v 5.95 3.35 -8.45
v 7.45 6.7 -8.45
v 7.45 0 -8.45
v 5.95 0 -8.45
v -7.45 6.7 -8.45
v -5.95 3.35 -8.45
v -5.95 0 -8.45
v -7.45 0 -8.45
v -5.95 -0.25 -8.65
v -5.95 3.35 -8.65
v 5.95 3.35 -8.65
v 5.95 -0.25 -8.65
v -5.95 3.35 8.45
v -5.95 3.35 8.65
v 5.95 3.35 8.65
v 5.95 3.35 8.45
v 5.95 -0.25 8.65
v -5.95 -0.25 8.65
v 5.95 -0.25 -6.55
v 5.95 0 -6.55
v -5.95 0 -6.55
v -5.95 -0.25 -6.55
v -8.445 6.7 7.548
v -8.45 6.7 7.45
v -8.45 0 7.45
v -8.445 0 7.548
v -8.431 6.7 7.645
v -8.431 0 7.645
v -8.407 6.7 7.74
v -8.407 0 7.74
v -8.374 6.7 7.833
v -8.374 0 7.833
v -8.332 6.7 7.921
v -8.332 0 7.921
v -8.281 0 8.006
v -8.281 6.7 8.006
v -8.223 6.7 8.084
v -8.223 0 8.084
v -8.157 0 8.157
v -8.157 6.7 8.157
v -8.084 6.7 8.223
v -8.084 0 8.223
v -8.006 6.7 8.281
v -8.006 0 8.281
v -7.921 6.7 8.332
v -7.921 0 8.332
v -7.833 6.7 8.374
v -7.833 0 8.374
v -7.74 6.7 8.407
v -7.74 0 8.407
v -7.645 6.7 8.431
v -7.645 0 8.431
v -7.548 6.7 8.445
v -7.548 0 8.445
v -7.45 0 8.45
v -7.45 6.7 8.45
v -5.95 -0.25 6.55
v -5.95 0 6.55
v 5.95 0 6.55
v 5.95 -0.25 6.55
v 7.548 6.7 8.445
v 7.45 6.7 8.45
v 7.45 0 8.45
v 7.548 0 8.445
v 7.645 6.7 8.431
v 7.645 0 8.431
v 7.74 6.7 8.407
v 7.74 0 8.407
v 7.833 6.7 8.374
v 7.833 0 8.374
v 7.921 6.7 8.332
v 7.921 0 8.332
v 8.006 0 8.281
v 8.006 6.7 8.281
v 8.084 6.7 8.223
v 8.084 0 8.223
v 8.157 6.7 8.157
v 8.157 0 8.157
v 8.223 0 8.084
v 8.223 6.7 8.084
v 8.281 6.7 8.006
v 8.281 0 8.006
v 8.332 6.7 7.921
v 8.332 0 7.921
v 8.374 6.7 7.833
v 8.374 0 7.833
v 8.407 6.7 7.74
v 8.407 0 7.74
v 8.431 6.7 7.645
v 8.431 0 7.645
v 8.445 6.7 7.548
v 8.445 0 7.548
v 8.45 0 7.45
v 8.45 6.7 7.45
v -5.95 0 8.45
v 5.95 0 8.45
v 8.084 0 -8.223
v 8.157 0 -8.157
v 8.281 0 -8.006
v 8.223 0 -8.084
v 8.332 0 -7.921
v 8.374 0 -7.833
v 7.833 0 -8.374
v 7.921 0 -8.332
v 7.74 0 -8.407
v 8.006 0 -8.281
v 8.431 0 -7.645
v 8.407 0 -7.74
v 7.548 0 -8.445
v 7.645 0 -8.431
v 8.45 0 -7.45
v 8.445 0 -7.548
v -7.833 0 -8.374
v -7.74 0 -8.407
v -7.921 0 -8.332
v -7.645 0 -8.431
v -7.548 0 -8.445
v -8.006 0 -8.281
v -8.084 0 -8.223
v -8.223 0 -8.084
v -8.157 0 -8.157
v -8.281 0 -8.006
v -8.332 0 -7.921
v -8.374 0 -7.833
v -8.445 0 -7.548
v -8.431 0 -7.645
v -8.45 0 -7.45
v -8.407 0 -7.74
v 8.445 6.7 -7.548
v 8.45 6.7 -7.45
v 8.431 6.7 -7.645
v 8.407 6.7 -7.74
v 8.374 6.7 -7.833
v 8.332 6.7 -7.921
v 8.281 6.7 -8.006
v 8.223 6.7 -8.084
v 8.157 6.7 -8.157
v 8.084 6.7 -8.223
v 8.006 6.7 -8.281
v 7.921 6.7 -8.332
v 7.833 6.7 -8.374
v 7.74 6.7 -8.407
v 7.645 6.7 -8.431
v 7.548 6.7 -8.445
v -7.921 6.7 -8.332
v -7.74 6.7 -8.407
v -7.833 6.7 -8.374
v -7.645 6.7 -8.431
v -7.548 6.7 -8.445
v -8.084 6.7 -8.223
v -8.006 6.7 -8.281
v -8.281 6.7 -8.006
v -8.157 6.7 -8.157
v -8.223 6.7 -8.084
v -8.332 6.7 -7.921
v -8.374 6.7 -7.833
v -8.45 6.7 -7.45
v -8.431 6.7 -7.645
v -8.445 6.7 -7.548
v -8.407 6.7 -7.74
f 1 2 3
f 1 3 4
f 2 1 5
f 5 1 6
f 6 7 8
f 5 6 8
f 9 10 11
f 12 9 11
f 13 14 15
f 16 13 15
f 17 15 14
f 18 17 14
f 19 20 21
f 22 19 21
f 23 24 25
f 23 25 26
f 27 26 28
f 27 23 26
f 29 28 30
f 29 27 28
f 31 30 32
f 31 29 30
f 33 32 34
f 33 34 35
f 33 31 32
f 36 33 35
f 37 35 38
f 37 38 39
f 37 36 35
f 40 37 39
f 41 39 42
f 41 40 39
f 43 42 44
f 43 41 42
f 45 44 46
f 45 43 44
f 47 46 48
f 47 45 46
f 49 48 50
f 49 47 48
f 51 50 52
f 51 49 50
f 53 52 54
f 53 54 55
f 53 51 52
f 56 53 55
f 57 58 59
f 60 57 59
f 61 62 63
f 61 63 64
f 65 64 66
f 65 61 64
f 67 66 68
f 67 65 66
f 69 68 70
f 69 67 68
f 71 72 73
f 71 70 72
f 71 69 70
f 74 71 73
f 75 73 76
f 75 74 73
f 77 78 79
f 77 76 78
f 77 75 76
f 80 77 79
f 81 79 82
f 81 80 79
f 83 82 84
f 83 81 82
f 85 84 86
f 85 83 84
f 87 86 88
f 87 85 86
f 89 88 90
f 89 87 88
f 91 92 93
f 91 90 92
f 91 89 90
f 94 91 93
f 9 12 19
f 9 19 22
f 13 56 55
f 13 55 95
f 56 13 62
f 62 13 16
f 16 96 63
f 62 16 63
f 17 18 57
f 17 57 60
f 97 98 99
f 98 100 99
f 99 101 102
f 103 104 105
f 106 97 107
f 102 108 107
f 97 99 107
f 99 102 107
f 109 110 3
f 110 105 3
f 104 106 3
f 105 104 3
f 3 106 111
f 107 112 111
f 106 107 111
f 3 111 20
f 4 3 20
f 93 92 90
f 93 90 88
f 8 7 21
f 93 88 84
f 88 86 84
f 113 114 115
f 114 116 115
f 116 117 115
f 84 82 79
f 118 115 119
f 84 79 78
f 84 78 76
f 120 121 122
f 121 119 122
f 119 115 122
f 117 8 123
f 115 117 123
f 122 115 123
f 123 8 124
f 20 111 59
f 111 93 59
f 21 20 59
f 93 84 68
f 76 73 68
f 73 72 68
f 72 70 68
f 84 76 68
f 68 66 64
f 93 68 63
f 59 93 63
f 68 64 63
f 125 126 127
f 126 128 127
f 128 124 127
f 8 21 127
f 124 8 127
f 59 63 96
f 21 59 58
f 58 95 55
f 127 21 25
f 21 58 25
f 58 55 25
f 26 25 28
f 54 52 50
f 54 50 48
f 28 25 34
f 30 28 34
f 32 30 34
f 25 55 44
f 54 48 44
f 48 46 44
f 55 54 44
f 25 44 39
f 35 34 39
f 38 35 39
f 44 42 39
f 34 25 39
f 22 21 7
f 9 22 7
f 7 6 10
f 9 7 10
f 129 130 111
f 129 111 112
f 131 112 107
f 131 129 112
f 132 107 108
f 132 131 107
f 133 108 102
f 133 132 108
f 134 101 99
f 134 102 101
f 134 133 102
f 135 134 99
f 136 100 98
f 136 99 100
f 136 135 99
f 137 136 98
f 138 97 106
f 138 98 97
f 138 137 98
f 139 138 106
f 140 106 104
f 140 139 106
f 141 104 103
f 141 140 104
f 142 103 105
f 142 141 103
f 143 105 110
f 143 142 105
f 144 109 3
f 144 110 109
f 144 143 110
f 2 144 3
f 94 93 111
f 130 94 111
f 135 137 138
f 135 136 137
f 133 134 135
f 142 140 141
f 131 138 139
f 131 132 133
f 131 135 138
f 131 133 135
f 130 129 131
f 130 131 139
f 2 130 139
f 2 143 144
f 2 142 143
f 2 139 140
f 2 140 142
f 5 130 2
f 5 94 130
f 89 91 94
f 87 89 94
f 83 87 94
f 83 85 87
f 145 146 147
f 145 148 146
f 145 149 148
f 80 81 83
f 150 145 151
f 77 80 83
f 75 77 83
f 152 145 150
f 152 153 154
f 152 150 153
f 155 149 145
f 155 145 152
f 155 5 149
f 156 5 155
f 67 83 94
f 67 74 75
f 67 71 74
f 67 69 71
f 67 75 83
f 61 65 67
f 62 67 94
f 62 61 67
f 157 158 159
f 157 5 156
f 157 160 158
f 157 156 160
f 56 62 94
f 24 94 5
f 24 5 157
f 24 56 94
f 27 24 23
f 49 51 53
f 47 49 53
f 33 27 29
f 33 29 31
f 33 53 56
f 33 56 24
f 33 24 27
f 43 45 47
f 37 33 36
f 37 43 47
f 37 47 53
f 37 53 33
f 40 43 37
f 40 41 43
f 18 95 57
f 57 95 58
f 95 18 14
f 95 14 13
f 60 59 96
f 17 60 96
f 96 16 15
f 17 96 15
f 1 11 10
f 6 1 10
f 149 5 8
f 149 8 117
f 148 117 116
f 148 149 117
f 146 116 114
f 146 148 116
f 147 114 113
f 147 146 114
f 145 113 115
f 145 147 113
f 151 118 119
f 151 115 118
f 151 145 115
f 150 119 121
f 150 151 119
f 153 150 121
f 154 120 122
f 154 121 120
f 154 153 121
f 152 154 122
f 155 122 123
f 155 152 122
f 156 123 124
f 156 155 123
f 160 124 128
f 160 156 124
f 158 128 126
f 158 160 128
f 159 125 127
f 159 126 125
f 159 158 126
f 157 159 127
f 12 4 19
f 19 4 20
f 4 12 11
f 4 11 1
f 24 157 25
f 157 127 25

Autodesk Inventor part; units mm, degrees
ref_plane "YZ Plane" through (0, 0, 0) normal (1, 0, 0) x (0, 1, 0)
ref_plane "XZ Plane" through (0, 0, 0) normal (0, 1, 0) x (-1, 0, 0)
ref_plane "XY Plane" through (0, 0, 0) normal (0, 0, 1) x (1, 0, 0)
sketch "Sketch1" plane through (0, 0, 0) normal (0, 1, 0) x (-1, 0, 0)
  line L0 (8.45, 8.45) -> (-8.45, 8.45)
  line L1 (-8.45, 8.45) -> (-8.45, -8.45)
  line L2 (-8.45, -8.45) -> (8.45, -8.45)
  line L3 (8.45, -8.45) -> (8.45, 8.45)
  point P0 (0, 0)
  dimension "d0" = 16.9
  dimension "d1" = 16.9
  dimension "d2" = 8.45
  dimension "d3" = 8.45
extrude "Extrusion1" add sketch "Sketch1" along normal blind 6.7
fillet "Fillet1" radius 1 4 edges at (8.45, 3.35, -8.45) (8.45, 3.35, 8.45) (-8.45, 3.35, 8.45) (-8.45, 3.35, -8.45)
sketch "Sketch2" plane through (0, 0, 0) normal (0, -1, 0) x (1, 0, 0)
  line L0 (5.95, 8.65) -> (-5.95, 8.65)
  line L1 (-5.95, 8.65) -> (-5.95, 6.55)
  line L2 (-5.95, 6.55) -> (5.95, 6.55)
  line L3 (5.95, 6.55) -> (5.95, 8.65)
  point P0 (0, 0)
  dimension "d7" = 11.9
  dimension "d8" = 5.95
  dimension "d9" = 2.1
  dimension "d10" = 8.65
extrude "Extrusion2" add sketch "Sketch2" along normal blind 0.25 and the other way blind 3.35
mirror "Mirror1" about plane through (0, 0, 0) normal (0, 0, 1) of "Extrusion2"
properties part number "SRP1770TA-101M"
